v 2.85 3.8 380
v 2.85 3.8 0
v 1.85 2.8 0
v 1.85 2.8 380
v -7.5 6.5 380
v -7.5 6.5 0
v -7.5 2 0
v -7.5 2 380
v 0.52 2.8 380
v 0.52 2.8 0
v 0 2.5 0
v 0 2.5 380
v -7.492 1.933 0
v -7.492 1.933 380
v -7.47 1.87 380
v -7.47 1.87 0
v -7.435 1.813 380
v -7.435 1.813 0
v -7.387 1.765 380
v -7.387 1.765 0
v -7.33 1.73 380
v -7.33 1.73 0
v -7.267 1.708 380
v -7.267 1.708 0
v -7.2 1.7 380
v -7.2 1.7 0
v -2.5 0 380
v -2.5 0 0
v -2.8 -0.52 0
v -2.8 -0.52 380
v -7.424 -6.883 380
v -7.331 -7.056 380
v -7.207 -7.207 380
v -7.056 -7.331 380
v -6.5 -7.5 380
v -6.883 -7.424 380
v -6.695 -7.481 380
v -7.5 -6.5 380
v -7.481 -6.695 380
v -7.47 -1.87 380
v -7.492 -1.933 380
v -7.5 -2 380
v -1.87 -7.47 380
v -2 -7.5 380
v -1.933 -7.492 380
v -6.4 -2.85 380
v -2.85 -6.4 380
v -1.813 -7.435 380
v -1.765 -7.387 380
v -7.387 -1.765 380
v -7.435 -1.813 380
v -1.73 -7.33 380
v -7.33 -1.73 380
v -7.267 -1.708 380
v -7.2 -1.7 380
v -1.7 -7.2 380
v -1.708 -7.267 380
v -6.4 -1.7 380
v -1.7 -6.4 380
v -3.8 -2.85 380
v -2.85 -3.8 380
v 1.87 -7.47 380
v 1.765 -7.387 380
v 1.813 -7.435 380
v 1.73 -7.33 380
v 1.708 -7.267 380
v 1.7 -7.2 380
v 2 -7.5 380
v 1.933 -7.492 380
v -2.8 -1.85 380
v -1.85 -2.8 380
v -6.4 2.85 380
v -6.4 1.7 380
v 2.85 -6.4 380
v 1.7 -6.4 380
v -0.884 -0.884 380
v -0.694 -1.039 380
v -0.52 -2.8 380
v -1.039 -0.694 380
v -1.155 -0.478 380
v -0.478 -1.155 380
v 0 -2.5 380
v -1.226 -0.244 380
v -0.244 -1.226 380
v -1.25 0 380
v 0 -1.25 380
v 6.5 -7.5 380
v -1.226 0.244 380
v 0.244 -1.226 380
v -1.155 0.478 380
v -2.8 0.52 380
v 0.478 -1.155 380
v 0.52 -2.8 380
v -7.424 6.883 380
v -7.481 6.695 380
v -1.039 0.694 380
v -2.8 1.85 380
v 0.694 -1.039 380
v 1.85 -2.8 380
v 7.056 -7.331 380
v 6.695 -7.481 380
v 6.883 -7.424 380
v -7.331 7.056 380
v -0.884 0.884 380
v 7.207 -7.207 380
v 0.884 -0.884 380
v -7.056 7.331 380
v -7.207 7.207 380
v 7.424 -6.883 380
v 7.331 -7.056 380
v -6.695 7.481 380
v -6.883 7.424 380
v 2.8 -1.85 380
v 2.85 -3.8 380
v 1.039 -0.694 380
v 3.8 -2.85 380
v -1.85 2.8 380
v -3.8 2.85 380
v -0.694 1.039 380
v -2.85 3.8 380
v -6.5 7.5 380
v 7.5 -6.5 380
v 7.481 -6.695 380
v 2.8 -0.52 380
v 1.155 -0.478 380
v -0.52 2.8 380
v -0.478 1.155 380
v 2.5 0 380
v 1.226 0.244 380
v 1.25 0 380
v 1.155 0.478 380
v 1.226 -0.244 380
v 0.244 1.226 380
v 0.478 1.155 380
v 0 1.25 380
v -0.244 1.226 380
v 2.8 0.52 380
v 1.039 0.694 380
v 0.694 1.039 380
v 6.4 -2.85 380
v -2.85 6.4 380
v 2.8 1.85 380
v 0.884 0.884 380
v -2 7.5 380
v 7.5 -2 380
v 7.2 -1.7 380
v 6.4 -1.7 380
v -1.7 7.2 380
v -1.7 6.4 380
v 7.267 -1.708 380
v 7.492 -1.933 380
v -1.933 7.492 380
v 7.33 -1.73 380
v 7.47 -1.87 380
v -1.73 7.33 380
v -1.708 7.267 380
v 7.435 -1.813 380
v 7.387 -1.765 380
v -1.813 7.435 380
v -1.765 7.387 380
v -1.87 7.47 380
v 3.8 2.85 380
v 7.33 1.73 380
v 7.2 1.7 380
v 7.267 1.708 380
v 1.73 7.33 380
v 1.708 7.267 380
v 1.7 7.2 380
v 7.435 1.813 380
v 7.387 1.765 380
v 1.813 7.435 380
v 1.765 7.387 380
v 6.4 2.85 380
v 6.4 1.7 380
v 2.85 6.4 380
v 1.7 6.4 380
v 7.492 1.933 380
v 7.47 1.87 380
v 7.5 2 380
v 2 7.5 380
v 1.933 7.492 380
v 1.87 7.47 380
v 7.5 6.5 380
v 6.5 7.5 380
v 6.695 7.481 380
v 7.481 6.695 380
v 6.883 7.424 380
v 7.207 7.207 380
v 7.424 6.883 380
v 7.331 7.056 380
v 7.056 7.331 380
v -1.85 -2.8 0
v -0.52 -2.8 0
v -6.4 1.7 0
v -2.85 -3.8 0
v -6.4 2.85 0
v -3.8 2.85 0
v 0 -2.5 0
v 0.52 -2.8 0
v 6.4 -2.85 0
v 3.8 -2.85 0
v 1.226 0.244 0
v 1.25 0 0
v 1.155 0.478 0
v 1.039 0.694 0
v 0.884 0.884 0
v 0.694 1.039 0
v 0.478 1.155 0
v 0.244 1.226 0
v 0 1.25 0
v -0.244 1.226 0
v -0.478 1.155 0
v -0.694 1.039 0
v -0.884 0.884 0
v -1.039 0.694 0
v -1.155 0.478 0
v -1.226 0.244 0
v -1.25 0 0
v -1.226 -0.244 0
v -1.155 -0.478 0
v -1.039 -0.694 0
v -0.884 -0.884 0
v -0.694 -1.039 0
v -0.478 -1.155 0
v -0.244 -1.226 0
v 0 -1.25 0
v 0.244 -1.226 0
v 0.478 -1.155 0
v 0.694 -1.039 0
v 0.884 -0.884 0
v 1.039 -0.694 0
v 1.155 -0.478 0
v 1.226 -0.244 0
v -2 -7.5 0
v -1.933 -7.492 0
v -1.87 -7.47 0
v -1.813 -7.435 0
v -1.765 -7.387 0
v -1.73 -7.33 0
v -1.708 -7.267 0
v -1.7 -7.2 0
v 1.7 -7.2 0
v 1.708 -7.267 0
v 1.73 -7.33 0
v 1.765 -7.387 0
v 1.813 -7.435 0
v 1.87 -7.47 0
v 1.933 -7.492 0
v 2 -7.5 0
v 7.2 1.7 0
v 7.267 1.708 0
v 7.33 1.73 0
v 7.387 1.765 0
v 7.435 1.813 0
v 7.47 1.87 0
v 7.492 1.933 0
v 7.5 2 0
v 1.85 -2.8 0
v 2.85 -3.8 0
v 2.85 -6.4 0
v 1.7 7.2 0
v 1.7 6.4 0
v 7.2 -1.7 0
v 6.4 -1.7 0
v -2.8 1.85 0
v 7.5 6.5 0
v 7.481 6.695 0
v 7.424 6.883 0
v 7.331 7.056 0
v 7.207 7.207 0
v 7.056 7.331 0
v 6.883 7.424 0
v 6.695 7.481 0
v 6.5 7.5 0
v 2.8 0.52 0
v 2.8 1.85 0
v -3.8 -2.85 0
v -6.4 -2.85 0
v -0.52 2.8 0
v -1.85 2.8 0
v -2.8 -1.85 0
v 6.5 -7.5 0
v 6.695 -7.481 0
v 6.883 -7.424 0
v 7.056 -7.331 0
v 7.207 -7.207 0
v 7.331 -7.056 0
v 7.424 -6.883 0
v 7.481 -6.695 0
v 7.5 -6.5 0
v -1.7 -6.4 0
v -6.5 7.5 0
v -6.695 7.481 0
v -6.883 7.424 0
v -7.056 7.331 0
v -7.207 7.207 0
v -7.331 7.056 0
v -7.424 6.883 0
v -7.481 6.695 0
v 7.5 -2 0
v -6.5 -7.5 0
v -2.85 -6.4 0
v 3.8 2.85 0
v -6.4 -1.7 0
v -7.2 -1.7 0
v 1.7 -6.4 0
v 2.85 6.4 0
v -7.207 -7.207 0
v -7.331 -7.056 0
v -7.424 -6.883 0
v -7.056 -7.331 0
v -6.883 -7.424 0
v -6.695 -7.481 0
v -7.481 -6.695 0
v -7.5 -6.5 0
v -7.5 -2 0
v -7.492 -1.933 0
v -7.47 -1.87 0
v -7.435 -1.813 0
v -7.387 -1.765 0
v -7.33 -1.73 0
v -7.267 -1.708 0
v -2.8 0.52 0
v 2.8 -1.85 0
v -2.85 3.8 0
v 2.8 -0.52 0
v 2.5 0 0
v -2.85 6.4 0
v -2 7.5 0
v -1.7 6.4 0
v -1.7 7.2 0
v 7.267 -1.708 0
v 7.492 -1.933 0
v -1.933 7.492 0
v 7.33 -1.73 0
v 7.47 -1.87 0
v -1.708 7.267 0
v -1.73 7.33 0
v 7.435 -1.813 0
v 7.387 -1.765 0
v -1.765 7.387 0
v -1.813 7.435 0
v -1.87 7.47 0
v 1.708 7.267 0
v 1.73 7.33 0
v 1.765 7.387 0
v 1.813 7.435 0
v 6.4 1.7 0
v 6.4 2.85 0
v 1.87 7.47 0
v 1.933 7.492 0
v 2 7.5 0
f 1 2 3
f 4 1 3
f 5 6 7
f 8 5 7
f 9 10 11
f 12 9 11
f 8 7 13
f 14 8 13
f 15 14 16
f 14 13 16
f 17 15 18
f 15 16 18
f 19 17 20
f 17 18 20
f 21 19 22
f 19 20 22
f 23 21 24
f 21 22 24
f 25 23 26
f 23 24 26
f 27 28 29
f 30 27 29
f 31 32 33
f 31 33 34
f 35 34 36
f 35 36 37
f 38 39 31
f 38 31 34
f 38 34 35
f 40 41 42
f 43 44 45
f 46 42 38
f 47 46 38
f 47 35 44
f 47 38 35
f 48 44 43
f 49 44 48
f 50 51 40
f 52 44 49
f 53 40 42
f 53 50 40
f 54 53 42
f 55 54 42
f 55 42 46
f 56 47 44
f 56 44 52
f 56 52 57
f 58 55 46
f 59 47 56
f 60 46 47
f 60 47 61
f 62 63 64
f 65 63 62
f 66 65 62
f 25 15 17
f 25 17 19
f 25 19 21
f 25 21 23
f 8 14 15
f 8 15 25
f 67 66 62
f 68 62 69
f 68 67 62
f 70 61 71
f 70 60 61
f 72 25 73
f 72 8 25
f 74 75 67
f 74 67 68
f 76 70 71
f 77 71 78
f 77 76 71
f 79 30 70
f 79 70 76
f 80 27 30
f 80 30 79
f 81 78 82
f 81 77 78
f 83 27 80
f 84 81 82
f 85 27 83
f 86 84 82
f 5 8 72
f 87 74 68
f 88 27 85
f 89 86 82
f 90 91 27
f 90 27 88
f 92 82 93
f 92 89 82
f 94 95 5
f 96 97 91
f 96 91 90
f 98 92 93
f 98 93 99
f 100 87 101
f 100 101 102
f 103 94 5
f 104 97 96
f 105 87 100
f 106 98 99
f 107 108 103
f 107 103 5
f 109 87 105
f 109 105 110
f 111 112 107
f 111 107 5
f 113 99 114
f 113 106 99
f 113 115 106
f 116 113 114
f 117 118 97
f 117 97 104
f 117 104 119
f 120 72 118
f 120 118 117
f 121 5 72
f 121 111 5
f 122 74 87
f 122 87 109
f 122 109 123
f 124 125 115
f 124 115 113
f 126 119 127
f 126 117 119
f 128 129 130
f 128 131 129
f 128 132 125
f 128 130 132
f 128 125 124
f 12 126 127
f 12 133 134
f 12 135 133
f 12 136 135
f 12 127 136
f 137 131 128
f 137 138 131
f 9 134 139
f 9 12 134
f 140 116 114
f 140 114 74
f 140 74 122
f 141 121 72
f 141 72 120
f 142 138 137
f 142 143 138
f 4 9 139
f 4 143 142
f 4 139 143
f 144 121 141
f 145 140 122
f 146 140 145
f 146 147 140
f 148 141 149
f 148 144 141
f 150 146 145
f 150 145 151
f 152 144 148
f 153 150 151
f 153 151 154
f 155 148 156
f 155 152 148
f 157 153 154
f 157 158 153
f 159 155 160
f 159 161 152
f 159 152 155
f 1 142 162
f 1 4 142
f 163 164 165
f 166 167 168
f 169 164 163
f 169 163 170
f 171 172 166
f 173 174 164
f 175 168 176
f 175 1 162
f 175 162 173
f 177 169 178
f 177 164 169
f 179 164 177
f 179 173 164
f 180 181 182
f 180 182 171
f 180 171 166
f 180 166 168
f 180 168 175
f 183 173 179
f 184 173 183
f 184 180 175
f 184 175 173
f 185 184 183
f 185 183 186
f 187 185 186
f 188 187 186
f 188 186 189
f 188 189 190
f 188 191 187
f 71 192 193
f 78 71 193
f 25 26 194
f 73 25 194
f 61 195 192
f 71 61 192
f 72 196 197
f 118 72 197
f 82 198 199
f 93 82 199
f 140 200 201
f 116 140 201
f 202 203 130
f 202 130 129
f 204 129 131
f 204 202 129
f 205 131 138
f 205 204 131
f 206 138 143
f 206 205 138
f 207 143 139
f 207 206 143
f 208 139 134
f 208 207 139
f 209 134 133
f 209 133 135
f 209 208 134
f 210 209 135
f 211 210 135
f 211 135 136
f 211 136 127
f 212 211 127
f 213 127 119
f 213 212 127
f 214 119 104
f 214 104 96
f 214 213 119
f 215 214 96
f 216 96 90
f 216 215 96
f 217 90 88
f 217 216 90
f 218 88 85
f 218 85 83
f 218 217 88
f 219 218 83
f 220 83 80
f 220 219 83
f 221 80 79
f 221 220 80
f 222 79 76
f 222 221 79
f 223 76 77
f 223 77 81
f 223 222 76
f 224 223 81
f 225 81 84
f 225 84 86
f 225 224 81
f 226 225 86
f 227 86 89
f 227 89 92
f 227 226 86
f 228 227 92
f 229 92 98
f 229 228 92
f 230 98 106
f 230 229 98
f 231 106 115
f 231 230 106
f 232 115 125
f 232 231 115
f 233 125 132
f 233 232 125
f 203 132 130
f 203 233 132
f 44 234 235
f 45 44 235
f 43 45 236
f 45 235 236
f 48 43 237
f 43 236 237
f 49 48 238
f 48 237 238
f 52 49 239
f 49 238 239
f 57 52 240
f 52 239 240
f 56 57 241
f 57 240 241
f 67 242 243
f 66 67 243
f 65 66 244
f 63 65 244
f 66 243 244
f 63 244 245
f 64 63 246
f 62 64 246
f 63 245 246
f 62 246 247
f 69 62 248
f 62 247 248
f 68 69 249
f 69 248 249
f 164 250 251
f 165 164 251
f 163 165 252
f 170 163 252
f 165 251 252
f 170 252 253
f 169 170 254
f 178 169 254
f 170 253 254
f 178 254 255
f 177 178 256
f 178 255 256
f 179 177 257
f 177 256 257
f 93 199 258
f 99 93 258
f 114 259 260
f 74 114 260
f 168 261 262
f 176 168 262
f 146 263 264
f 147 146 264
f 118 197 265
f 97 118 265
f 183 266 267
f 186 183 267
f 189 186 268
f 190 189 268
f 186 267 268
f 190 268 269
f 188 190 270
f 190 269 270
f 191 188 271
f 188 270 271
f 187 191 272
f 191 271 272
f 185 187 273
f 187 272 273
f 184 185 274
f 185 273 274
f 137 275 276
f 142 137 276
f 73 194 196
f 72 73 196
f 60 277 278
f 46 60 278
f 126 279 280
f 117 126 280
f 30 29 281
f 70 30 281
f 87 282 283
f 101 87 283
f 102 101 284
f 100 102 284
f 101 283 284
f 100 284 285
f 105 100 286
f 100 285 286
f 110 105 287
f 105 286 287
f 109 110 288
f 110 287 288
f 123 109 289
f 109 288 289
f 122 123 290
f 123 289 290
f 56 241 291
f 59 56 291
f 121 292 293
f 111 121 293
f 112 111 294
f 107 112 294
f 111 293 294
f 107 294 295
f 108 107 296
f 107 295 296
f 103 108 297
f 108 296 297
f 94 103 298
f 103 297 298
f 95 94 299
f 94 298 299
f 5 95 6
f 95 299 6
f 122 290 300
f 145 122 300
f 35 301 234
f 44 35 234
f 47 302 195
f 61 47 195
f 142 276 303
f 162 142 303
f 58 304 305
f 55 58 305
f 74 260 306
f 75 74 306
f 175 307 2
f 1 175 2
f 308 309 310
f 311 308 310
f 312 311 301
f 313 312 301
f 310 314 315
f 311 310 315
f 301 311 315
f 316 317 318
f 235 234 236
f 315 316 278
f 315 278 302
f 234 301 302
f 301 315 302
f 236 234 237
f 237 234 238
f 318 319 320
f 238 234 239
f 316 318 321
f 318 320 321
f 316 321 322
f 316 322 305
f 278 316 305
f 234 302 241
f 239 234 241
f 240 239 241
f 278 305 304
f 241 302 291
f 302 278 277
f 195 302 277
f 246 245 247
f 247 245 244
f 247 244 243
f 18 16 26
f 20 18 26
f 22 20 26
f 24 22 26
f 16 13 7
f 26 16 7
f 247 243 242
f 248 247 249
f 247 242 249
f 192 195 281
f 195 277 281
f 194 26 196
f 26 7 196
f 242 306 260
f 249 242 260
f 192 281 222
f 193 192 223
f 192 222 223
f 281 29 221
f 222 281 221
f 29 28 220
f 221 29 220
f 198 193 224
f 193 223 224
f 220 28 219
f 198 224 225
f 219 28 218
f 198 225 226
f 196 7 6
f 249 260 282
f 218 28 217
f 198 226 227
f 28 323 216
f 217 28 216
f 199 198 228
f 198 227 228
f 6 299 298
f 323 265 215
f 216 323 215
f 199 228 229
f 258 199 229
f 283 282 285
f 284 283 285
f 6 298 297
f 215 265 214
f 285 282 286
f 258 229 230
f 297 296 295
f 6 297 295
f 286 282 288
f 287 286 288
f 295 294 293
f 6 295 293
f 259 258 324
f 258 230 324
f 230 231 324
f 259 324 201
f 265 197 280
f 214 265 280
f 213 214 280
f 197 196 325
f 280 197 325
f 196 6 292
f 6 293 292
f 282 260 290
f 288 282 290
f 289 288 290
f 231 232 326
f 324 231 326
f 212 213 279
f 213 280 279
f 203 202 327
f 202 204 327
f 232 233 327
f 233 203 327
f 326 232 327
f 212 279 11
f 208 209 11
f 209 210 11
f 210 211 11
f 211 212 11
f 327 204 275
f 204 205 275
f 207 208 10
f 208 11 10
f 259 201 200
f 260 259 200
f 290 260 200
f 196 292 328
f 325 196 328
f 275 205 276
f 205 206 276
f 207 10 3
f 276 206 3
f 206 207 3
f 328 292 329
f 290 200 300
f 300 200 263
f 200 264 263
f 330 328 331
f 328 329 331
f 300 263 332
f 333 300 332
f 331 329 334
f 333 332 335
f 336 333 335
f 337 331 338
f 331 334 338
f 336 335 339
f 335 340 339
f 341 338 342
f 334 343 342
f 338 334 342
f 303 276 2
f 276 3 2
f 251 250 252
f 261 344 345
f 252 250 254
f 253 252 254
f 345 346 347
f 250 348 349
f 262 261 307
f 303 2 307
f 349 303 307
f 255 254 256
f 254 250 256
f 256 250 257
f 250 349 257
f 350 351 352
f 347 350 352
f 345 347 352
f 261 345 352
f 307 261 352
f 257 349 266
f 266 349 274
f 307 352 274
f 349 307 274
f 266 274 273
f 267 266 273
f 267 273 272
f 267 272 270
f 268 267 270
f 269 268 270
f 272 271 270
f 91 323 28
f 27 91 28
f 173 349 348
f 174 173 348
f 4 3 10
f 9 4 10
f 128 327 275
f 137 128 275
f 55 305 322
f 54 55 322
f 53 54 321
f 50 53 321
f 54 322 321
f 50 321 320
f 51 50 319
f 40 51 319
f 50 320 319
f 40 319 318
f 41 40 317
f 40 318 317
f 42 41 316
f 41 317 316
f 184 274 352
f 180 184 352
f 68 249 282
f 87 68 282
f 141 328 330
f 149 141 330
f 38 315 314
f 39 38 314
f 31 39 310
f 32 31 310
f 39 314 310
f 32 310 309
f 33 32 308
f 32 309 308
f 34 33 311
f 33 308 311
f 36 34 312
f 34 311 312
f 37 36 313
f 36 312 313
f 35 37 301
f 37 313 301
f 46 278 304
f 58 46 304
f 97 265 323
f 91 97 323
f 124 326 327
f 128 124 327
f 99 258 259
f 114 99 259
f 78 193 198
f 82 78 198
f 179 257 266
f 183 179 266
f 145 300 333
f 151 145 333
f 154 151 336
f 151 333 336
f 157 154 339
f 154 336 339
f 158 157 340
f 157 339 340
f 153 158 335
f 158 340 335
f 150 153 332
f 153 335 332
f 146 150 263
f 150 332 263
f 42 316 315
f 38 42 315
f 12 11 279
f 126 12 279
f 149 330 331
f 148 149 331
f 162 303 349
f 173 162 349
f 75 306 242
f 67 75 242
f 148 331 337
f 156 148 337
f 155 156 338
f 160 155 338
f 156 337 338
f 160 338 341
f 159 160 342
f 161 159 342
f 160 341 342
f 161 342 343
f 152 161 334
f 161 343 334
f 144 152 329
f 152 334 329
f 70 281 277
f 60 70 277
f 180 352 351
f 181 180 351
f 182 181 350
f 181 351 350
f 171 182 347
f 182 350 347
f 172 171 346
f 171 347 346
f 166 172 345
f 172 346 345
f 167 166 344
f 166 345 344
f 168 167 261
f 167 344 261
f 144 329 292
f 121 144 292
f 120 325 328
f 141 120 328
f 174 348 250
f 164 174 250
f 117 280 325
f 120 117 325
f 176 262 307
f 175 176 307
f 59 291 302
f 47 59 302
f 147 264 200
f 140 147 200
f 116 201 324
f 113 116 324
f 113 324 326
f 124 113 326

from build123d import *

# Parameters (mm, degrees)
SKETCH1_R           = 1.25
BOSS_EXTRUDE1_DEPTH = 380


with BuildPart() as part:
    # Sketch1 → Boss-Extrude1 (new body)
    with BuildSketch(Plane.XY):
        with BuildLine():
            Line((-7.2, 1.7), (-6.4, 1.7))
            Line((-6.4, 1.7), (-6.4, 2.85))
            Line((-6.4, 2.85), (-3.8, 2.85))
            Line((-3.8, 2.85), (-2.8, 1.85))
            Line((-2.8, 1.85), (-2.8, 0.519615242))
            Line((-2.8, 0.519615242), (-2.5, 0))
            Line((-2.5, 0), (-2.8, -0.519615242))
            Line((-2.8, -0.519615242), (-2.8, -1.85))
            Line((-2.8, -1.85), (-3.8, -2.85))
            Line((-3.8, -2.85), (-6.4, -2.85))
            Line((-6.4, -2.85), (-6.4, -1.7))
            Line((-6.4, -1.7), (-7.2, -1.7))
            ThreePointArc((-7.2, -1.7), (-7.412132034, -1.787867966), (-7.5, -2))
            Line((-7.5, -2), (-7.5, -6.5))
            ThreePointArc((-7.5, -6.5), (-7.207106781, -7.207106781), (-6.5, -7.5))
            Line((-6.5, -7.5), (-2, -7.5))
            ThreePointArc((-2, -7.5), (-1.787867966, -7.412132034), (-1.7, -7.2))
            Line((-1.7, -7.2), (-1.7, -6.4))
            Line((-1.7, -6.4), (-2.85, -6.4))
            Line((-2.85, -6.4), (-2.85, -3.8))
            Line((-2.85, -3.8), (-1.85, -2.8))
            Line((-1.85, -2.8), (-0.519615242, -2.8))
            Line((-0.519615242, -2.8), (0, -2.5))
            Line((0, -2.5), (0.519615242, -2.8))
            Line((0.519615242, -2.8), (1.85, -2.8))
            Line((1.85, -2.8), (2.85, -3.8))
            Line((2.85, -3.8), (2.85, -6.4))
            Line((2.85, -6.4), (1.7, -6.4))
            Line((1.7, -6.4), (1.7, -7.2))
            ThreePointArc((1.7, -7.2), (1.787867966, -7.412132034), (2, -7.5))
            Line((2, -7.5), (6.5, -7.5))
            ThreePointArc((6.5, -7.5), (7.207106781, -7.207106781), (7.5, -6.5))
            Line((7.5, -6.5), (7.5, -2))
            ThreePointArc((7.5, -2), (7.412132034, -1.787867966), (7.2, -1.7))
            Line((7.2, -1.7), (6.4, -1.7))
            Line((6.4, -1.7), (6.4, -2.85))
            Line((6.4, -2.85), (3.8, -2.85))
            Line((3.8, -2.85), (2.8, -1.85))
            Line((2.8, -1.85), (2.8, -0.519615242))
            Line((2.8, -0.519615242), (2.5, 0))
            Line((2.5, 0), (2.8, 0.519615242))
            Line((2.8, 0.519615242), (2.8, 1.85))
            Line((2.8, 1.85), (3.8, 2.85))
            Line((3.8, 2.85), (6.4, 2.85))
            Line((6.4, 2.85), (6.4, 1.7))
            Line((6.4, 1.7), (7.2, 1.7))
            ThreePointArc((7.2, 1.7), (7.412132034, 1.787867966), (7.5, 2))
            Line((7.5, 2), (7.5, 6.5))
            ThreePointArc((7.5, 6.5), (7.207106781, 7.207106781), (6.5, 7.5))
            Line((6.5, 7.5), (2, 7.5))
            ThreePointArc((2, 7.5), (1.787867966, 7.412132034), (1.7, 7.2))
            Line((1.7, 7.2), (1.7, 6.4))
            Line((1.7, 6.4), (2.85, 6.4))
            Line((2.85, 6.4), (2.85, 3.8))
            Line((2.85, 3.8), (1.85, 2.8))
            Line((1.85, 2.8), (0.519615242, 2.8))
            Line((0.519615242, 2.8), (0, 2.5))
            Line((0, 2.5), (-0.519615242, 2.8))
            Line((-0.519615242, 2.8), (-1.85, 2.8))
            Line((-1.85, 2.8), (-2.85, 3.8))
            Line((-2.85, 3.8), (-2.85, 6.4))
            Line((-2.85, 6.4), (-1.7, 6.4))
            Line((-1.7, 6.4), (-1.7, 7.2))
            ThreePointArc((-1.7, 7.2), (-1.787867966, 7.412132034), (-2, 7.5))
            Line((-2, 7.5), (-6.5, 7.5))
            ThreePointArc((-6.5, 7.5), (-7.207106781, 7.207106781), (-7.5, 6.5))
            Line((-7.5, 6.5), (-7.5, 2))
            ThreePointArc((-7.5, 2), (-7.412132034, 1.787867966), (-7.2, 1.7))
        make_face()
        Circle(SKETCH1_R, mode=Mode.SUBTRACT)
    extrude(amount=BOSS_EXTRUDE1_DEPTH)


solid = part.part
